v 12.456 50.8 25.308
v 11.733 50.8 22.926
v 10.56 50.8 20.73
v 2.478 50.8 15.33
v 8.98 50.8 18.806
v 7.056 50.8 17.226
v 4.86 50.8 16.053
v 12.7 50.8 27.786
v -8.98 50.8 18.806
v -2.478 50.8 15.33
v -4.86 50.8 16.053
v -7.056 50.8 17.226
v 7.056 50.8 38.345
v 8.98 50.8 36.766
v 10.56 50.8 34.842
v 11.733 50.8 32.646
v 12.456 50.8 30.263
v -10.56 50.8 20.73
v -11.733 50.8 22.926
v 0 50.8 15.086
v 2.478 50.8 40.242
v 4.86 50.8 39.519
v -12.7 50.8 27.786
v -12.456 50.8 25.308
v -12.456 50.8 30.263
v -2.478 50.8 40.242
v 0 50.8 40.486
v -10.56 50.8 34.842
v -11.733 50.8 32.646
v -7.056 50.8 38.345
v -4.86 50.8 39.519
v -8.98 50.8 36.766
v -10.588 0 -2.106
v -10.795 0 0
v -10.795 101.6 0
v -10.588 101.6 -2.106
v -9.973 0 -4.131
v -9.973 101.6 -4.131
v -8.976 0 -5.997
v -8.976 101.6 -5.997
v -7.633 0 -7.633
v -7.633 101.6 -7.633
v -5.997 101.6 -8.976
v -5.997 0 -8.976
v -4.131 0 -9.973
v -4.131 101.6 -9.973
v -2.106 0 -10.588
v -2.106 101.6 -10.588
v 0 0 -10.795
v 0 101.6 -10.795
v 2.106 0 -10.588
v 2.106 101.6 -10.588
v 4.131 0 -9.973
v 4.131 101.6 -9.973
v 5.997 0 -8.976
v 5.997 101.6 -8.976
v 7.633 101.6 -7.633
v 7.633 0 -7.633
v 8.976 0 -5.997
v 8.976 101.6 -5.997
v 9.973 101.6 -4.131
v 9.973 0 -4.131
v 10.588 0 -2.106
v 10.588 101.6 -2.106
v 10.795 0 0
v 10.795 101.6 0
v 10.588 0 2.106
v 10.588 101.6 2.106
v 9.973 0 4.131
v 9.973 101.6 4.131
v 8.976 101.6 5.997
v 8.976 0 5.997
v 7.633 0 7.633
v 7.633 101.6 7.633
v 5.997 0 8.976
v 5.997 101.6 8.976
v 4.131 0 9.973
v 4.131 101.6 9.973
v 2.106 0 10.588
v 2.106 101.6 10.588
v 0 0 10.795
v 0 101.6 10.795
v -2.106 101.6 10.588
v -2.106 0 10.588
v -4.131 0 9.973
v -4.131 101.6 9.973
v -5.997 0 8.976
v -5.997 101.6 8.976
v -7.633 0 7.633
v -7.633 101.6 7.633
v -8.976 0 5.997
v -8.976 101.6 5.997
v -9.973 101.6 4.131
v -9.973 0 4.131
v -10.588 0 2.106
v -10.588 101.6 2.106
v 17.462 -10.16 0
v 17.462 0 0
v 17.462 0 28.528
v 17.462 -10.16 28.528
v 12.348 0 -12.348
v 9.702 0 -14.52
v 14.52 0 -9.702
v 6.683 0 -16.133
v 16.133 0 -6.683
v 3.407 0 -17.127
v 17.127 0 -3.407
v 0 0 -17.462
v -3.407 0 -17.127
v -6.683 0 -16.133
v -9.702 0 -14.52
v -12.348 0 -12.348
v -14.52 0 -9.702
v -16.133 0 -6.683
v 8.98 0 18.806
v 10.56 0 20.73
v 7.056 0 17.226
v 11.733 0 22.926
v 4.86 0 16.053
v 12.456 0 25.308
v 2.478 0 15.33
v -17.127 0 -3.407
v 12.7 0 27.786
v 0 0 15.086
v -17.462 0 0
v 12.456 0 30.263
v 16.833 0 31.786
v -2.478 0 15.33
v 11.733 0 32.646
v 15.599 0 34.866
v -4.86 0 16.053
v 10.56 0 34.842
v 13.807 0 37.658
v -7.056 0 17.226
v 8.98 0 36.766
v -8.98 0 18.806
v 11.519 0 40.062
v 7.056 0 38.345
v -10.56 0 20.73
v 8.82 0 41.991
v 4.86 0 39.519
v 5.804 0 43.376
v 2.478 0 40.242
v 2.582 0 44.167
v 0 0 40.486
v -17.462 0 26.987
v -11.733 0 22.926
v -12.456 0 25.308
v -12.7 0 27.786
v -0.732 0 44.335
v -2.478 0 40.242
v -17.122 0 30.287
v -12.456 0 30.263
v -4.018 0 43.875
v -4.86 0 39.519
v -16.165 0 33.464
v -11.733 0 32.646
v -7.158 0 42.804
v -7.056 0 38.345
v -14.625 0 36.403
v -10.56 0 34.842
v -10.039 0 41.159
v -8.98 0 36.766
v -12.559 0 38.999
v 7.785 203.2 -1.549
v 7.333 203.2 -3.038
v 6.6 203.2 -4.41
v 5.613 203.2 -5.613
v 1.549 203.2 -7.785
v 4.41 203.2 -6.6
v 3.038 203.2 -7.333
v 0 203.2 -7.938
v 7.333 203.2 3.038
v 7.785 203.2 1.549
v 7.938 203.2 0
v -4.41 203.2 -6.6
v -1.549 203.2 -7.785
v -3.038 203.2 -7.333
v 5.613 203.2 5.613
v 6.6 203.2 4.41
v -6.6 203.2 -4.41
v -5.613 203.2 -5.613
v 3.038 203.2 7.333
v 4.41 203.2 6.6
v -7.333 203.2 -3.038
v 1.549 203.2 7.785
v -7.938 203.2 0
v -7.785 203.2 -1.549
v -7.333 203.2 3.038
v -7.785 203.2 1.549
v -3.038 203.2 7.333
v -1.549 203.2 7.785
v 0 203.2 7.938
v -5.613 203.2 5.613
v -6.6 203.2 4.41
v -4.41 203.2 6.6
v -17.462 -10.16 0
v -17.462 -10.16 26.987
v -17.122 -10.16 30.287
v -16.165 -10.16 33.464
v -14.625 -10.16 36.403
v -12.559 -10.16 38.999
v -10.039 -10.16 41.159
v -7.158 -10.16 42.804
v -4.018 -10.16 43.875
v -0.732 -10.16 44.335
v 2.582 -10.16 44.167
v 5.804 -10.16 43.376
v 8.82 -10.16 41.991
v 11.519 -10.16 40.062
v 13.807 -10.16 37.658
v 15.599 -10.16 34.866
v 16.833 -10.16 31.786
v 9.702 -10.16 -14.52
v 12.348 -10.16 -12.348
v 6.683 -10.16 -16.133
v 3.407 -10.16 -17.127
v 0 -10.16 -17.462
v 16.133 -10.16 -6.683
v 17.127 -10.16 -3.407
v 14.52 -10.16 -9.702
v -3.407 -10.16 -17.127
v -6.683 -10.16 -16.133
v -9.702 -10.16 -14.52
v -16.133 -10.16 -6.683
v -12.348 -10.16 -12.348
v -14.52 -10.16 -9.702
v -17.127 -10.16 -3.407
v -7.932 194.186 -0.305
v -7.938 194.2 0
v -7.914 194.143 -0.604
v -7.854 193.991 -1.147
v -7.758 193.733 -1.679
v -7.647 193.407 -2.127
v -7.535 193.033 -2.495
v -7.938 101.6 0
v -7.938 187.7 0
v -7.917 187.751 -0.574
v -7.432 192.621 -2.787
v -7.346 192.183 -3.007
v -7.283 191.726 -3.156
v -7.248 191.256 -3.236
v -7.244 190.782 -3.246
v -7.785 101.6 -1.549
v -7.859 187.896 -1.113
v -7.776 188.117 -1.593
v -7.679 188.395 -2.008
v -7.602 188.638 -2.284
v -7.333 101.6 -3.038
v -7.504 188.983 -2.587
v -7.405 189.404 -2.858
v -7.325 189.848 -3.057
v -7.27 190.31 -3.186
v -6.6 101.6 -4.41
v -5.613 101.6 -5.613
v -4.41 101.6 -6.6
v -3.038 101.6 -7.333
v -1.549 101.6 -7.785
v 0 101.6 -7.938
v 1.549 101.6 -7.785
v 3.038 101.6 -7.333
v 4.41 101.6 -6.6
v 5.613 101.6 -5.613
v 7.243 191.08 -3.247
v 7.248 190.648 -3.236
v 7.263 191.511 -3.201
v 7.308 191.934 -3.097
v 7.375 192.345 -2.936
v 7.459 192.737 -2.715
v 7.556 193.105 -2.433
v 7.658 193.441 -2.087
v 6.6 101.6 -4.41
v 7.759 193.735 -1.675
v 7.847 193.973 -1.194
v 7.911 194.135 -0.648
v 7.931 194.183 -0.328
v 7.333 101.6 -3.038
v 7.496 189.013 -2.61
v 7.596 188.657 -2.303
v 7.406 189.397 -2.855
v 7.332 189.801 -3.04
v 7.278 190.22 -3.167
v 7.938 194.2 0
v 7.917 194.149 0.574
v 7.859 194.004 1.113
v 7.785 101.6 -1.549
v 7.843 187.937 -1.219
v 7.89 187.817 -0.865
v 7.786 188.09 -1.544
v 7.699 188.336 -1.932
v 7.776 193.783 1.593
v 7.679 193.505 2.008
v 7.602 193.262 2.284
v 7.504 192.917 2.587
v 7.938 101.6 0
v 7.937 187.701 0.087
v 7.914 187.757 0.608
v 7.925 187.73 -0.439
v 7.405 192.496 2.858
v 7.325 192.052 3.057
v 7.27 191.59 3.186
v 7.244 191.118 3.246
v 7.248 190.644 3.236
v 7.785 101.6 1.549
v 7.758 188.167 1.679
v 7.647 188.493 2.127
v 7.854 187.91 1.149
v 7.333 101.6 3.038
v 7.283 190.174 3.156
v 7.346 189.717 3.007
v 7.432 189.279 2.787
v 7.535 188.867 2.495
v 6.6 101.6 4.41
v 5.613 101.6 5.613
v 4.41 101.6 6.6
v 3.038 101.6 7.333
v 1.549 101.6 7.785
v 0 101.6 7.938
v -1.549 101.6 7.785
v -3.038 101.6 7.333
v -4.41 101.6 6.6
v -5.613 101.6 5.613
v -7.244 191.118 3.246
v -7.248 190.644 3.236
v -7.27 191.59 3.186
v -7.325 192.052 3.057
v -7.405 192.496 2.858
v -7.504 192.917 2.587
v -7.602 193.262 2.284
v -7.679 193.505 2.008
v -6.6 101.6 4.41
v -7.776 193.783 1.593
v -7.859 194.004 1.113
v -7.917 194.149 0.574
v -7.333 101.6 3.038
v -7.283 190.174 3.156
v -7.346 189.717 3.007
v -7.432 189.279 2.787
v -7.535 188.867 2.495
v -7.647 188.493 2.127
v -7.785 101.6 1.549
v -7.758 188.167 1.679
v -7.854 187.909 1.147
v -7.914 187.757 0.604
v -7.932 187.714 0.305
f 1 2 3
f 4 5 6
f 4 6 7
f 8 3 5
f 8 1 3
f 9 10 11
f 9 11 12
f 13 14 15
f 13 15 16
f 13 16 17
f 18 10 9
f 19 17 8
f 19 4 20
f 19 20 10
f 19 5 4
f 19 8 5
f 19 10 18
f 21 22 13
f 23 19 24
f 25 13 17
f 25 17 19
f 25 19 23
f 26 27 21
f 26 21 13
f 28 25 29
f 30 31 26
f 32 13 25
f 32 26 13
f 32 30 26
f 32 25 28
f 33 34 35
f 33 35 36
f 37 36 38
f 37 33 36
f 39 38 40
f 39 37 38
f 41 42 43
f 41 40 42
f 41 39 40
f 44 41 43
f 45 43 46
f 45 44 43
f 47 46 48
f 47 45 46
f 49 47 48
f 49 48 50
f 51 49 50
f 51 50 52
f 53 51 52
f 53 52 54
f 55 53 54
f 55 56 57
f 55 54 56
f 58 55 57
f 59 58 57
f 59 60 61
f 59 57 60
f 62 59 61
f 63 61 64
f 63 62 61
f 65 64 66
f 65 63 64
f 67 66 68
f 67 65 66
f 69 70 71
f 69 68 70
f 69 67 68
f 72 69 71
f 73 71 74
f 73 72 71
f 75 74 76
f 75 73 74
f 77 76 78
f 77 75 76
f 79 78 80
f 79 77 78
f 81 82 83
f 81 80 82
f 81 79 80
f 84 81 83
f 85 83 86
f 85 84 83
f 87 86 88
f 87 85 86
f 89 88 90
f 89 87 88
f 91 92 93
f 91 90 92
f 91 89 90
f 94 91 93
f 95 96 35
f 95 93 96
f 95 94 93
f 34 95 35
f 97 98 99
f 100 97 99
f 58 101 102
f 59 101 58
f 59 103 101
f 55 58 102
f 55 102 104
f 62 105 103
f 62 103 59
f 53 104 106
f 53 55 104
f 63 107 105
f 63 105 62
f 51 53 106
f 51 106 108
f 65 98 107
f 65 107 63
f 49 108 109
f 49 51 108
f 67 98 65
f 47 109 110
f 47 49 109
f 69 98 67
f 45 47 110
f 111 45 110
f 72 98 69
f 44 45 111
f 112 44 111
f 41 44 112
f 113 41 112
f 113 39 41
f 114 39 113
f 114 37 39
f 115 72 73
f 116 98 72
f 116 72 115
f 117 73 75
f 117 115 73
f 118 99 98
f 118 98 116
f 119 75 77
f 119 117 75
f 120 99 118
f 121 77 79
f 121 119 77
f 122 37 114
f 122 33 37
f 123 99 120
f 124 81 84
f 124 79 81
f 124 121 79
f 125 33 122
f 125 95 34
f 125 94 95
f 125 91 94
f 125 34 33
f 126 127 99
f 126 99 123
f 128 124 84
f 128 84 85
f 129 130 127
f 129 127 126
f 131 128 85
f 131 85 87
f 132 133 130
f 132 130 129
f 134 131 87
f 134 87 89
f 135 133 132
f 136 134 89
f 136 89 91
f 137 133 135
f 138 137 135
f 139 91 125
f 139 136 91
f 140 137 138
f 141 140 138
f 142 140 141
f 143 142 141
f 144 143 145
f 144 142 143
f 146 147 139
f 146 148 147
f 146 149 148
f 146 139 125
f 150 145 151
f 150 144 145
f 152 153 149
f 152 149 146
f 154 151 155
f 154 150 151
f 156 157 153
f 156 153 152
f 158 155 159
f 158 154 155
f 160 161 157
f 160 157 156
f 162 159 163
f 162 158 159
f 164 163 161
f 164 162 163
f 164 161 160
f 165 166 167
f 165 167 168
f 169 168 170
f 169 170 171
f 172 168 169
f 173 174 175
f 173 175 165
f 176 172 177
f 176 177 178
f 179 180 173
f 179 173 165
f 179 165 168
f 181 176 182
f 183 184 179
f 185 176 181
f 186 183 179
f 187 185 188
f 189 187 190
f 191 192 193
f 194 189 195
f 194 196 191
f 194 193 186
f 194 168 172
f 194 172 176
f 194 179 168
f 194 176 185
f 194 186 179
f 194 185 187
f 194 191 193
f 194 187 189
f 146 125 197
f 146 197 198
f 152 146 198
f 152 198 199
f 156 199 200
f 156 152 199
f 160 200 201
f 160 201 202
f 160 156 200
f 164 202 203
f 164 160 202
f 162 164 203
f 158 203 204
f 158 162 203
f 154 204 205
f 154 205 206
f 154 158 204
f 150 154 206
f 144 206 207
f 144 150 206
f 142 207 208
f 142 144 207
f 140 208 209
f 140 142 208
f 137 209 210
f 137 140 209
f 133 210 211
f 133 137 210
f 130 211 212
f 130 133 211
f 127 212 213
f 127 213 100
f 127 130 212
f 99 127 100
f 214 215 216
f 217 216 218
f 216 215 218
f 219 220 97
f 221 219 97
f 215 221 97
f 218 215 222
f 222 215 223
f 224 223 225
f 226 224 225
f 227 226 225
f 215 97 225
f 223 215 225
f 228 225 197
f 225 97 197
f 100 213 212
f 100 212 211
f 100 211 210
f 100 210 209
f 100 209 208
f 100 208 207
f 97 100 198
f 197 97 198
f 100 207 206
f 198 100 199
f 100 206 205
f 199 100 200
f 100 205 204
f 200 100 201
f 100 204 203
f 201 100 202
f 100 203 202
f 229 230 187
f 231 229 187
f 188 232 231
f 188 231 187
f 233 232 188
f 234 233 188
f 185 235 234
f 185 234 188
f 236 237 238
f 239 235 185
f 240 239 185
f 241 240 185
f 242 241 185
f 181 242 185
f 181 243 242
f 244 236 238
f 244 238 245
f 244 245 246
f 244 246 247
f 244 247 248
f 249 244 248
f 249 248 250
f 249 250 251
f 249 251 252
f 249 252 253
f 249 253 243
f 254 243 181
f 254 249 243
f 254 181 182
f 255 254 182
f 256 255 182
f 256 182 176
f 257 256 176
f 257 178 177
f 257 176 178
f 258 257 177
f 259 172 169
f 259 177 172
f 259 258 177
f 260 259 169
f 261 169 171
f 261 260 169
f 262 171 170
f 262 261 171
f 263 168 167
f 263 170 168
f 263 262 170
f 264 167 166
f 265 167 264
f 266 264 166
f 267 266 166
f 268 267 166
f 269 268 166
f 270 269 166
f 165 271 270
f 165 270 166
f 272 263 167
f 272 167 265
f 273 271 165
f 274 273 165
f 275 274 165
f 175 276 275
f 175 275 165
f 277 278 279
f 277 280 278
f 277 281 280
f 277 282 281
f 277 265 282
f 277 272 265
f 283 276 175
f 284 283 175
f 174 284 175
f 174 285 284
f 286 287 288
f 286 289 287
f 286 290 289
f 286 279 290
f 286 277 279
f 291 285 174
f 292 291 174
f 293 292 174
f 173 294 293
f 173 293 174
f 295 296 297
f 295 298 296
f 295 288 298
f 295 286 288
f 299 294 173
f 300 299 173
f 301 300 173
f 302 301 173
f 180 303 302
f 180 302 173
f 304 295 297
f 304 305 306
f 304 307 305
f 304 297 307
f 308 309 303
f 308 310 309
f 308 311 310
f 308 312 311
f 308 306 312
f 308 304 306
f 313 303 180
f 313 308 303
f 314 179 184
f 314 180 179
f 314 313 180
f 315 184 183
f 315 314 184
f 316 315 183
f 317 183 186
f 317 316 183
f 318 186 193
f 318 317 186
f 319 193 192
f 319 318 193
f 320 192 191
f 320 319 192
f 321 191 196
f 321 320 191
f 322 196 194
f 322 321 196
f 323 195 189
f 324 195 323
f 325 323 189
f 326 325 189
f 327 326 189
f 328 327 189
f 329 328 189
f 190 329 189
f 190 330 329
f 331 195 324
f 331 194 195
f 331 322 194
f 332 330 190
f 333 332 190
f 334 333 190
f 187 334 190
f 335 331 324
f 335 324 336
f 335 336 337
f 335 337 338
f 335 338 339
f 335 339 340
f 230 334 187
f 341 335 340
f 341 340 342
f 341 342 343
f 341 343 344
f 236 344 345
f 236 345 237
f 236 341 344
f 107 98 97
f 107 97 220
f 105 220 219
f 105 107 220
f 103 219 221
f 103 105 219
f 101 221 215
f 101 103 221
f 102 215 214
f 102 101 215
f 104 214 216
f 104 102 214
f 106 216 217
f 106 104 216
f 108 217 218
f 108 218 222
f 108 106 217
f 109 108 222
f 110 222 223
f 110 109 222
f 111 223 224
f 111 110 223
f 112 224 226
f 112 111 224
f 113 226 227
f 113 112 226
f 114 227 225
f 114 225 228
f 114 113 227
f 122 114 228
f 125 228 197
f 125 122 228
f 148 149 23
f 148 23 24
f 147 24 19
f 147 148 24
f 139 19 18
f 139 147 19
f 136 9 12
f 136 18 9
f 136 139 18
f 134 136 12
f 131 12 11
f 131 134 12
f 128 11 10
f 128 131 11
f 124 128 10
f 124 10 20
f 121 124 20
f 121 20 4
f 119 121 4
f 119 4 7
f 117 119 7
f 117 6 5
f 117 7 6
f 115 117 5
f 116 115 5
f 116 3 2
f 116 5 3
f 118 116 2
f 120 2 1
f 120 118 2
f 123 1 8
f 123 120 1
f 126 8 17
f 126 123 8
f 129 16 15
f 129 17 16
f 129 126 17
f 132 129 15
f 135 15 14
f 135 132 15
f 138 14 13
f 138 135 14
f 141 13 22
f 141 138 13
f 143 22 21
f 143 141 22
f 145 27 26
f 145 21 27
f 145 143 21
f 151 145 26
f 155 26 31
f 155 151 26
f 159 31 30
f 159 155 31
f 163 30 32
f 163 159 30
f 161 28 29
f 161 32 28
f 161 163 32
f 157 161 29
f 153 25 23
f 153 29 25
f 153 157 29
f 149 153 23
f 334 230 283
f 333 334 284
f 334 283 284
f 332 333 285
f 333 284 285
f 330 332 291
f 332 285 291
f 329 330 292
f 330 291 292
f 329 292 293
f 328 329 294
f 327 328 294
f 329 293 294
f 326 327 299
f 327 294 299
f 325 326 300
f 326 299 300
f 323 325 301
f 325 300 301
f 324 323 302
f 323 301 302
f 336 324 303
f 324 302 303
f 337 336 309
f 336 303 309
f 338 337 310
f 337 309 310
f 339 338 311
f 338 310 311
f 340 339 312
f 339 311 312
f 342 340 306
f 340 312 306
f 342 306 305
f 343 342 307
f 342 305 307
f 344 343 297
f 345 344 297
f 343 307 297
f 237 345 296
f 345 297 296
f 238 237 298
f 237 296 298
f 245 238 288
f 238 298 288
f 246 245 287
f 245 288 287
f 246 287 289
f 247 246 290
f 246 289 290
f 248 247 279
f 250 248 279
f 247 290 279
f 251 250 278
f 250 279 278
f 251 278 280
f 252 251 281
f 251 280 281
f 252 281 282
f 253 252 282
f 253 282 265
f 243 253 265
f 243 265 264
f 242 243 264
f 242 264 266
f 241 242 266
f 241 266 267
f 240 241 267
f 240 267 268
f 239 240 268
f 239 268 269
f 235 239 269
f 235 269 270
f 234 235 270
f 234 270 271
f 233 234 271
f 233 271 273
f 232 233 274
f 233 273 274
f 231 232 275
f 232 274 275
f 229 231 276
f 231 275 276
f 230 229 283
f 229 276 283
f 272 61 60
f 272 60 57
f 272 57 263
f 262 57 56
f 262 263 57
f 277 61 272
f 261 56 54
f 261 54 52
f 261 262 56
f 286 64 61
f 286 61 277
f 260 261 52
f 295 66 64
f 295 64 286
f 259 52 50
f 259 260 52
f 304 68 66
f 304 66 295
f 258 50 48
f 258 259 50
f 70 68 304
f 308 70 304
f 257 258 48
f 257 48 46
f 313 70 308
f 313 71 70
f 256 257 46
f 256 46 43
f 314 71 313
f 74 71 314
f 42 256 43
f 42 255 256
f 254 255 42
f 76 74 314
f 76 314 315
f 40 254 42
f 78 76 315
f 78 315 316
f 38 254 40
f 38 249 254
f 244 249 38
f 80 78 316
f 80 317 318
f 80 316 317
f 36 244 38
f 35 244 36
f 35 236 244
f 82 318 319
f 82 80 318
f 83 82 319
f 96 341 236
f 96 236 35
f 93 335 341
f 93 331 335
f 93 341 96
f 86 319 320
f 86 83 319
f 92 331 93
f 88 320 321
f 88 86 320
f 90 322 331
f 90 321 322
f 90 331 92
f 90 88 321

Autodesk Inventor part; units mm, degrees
ref_plane "YZ Plane" through (0, 0, 0) normal (1, 0, 0) x (0, 1, 0)
ref_plane "XY Plane" through (0, 0, 0) normal (0, 0, 1) x (1, 0, 0)
sketch "Sketch1" plane through (0, 0, 0) normal (0, 1, 0) x (-1, 0, 0)
  circle A0 centre (0, 0) radius 10.795
  circle A1 centre (0, 37.7825) radius 10.795
  dimension "d11" = 21.59
extrude "Extrusion1" add sketch "Sketch1" along normal blind 101.6 contours A0
sketch "Sketch2" plane through (0, 0, 0) normal (0, 1, 0) x (-1, 0, 0)
  circle A0 centre (0, 27.7858) radius 12.7
  point P0 (0, 0)
  dimension "d2" = 25.4
extrude "Extrusion2" add sketch "Sketch2" along normal blind 50.8
sketch "Sketch3" plane through (0, 0, 0) normal (0, 1, 0) x (-1, 0, 0)
  arc A0 (17.4625, 26.9867) -> (-17.4625, 28.5282) centre (-0.0401, 26.849) ccw
  arc A1 (-17.4625, 0) -> (17.4625, 0) centre (0, 0) ccw
  line L0 (17.4625, 0) -> (17.4625, 26.9867)
  line L1 (-17.4625, 0) -> (-17.4625, 28.5282)
extrude "Extrusion3" add sketch "Sketch3" against normal blind 10.16
sketch "Sketch4" plane through (0, 0, 0) normal (0, 1, 0) x (-1, 0, 0)
  point P0 (0, 0)
ref_plane "Work Plane1" through (0, 101.6, 0) normal (0, 1, 0) x (-1, 0, 0)
sketch "Sketch5" plane through (0, 101.6, 0) normal (0, 1, 0) x (-1, 0, 0)
  circle A0 centre (0, 0) radius 7.9375
  dimension "d8" = 15.875
extrude "Extrusion4" add sketch "Sketch5" along normal blind 101.6
sketch "Sketch6" plane through (0, 0, 0) normal (1, 0, 0) x (0, 1, 0)
  circle A0 centre (190.95, 0) radius 3.25
  line L0 (203.2, -7.9375) -> (203.2, 7.9375) projected
  line L1 (203.2, -7.9375) -> (203.2, 7.9375)
  point P0 (0, 0)
  dimension "d14" = 6.5
  dimension "d15" = 12.25
extrude "Extrusion5" cut sketch "Sketch6" along normal mid plane 101.6
properties part number "Linear Actuator"
